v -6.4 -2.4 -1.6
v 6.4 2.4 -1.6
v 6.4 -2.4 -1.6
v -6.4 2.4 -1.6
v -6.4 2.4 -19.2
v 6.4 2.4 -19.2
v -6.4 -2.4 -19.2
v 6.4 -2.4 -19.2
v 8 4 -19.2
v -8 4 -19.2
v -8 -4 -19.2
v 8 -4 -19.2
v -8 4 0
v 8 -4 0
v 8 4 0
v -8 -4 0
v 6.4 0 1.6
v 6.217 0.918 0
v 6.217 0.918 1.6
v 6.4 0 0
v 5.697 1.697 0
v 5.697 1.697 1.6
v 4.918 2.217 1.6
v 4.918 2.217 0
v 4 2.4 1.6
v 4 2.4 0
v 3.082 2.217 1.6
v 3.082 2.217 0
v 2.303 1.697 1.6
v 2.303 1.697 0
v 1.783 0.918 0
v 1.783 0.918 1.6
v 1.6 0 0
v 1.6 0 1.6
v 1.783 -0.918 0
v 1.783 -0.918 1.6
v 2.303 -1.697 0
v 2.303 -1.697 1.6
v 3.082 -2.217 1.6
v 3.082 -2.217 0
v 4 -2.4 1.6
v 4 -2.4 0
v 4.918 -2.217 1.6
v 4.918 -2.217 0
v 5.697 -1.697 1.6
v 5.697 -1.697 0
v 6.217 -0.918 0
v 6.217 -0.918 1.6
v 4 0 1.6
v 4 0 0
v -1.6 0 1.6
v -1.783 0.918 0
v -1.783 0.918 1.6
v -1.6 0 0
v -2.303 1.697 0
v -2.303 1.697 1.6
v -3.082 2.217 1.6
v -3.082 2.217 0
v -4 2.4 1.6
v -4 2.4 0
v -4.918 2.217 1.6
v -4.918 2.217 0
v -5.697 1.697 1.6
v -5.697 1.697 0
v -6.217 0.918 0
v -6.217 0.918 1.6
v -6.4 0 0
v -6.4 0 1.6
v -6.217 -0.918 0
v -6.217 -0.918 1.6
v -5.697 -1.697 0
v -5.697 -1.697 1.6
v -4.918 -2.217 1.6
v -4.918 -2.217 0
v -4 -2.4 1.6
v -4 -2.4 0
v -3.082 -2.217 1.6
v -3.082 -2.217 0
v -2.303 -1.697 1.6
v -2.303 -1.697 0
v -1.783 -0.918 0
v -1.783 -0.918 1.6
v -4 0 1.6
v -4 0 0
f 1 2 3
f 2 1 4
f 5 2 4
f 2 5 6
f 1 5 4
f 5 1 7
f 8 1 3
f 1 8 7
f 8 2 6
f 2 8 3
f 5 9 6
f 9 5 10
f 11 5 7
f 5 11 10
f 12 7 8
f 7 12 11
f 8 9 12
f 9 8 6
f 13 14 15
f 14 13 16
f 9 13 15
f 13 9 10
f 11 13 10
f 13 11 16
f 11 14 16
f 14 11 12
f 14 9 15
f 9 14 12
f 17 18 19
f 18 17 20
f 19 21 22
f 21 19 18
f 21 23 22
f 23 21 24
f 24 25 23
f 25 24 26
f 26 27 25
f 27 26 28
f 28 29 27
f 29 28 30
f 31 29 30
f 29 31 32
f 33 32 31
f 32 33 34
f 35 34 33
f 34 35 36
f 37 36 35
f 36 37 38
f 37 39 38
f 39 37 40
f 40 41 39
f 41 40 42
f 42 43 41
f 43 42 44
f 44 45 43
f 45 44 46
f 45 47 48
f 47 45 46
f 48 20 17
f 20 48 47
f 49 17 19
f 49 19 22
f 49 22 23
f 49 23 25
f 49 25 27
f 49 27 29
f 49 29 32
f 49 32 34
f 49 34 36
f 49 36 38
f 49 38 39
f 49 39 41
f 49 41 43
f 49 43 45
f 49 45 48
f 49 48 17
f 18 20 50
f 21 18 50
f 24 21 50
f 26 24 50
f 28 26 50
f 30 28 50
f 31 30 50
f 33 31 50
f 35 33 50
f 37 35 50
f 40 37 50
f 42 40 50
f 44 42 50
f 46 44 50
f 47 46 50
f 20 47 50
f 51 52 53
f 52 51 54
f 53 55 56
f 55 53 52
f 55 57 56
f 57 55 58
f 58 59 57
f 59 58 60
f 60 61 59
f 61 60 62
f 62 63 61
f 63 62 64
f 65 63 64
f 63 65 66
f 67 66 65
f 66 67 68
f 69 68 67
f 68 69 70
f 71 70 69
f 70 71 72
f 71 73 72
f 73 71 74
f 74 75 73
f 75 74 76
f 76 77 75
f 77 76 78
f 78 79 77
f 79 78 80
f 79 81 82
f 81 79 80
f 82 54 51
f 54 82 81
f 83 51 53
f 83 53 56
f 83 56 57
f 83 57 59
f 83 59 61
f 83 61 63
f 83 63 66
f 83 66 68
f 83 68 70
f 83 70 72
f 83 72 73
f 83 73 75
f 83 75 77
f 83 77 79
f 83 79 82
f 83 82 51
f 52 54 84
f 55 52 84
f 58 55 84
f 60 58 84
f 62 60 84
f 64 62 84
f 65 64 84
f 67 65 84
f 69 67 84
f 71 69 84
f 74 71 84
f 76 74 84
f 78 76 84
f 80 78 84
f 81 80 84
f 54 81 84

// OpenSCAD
// file: ../p/4-4edge.scad
use <../lib.scad>
function ldraw_lib__4_4edge() = [
// 0 Circle 1.0
// 0 Name: 4-4edge.dat
// 0 Author: James Jessiman
// 0 !LDRAW_ORG Primitive UPDATE 2017-01
// 0 !LICENSE Licensed under CC BY 2.0 and CC BY 4.0 : see CAreadme.txt
// 
// 0 BFC CERTIFY CCW
  [0,"BFC","CERTIFY"],
  [0,"BFC","CCW"],
// 
// 0 !HISTORY 1998-12-15 [PTadmin] Official Update 1998-10
// 0 !HISTORY 2005-12-28 [PTadmin] Official Update 2005-01
// 0 !HISTORY 2007-06-24 [PTadmin] Header formatted for Contributor Agreement
// 0 !HISTORY 2008-07-01 [PTadmin] Official Update 2008-01
// 0 !HISTORY 2017-01-15 [Steffen] BFCed
// 0 !HISTORY 2017-12-30 [PTadmin] Official Update 2017-01
// 
// 
// 2 24 1 0 0 0.9239 0 0.3827
  [2,24,1,0,0,0.9239,0,0.3827],
// 2 24 0.9239 0 0.3827 0.7071 0 0.7071
  [2,24,0.9239,0,0.3827,0.7071,0,0.7071],
// 2 24 0.7071 0 0.7071 0.3827 0 0.9239
  [2,24,0.7071,0,0.7071,0.3827,0,0.9239],
// 2 24 0.3827 0 0.9239 0 0 1
  [2,24,0.3827,0,0.9239,0,0,1],
// 2 24 0 0 1 -0.3827 0 0.9239
  [2,24,0,0,1,-0.3827,0,0.9239],
// 2 24 -0.3827 0 0.9239 -0.7071 0 0.7071
  [2,24,-0.3827,0,0.9239,-0.7071,0,0.7071],
// 2 24 -0.7071 0 0.7071 -0.9239 0 0.3827
  [2,24,-0.7071,0,0.7071,-0.9239,0,0.3827],
// 2 24 -0.9239 0 0.3827 -1 0 -0
  [2,24,-0.9239,0,0.3827,-1,0,-0],
// 2 24 -1 0 -0 -0.9239 0 -0.3827
  [2,24,-1,0,-0,-0.9239,0,-0.3827],
// 2 24 -0.9239 0 -0.3827 -0.7071 0 -0.7071
  [2,24,-0.9239,0,-0.3827,-0.7071,0,-0.7071],
// 2 24 -0.7071 0 -0.7071 -0.3827 0 -0.9239
  [2,24,-0.7071,0,-0.7071,-0.3827,0,-0.9239],
// 2 24 -0.3827 0 -0.9239 0 0 -1
  [2,24,-0.3827,0,-0.9239,0,0,-1],
// 2 24 0 0 -1 0.3827 0 -0.9239
  [2,24,0,0,-1,0.3827,0,-0.9239],
// 2 24 0.3827 0 -0.9239 0.7071 0 -0.7071
  [2,24,0.3827,0,-0.9239,0.7071,0,-0.7071],
// 2 24 0.7071 0 -0.7071 0.9239 0 -0.3827
  [2,24,0.7071,0,-0.7071,0.9239,0,-0.3827],
// 2 24 0.9239 0 -0.3827 1 0 0
  [2,24,0.9239,0,-0.3827,1,0,0],
];
module ldraw_lib__4_4edge(step=0, col=false, unit=2/5, alt=false, line=0.2, solid=!$preview)
    makepoly(ldraw_lib__4_4edge(), step=step, col=col, unit=unit, alt=alt, line=line, solid=solid);
ldraw_lib__4_4edge(line=0.2);
// file: ../p/4-4disc.scad
use <../lib.scad>
function ldraw_lib__4_4disc() = [
// 0 Disc 1.0
// 0 Name: 4-4disc.dat
// 0 Author: James Jessiman
// 0 !LDRAW_ORG Primitive UPDATE 2002-02
// 0 !LICENSE Licensed under CC BY 2.0 and CC BY 4.0 : see CAreadme.txt
// 
// 0 BFC CERTIFY CCW
  [0,"BFC","CERTIFY"],
  [0,"BFC","CCW"],
// 
// 0 !HISTORY 1998-12-15 [PTadmin] Official Update 1998-10
// 0 !HISTORY 2002-03-23 [sbliss] Added BFC statement
// 0 !HISTORY 2002-04-25 [PTadmin] Official Update 2002-02
// 0 !HISTORY 2007-06-24 [PTadmin] Header formatted for Contributor Agreement
// 0 !HISTORY 2008-07-01 [PTadmin] Official Update 2008-01
// 
// 
// 3 16 0 0 0 1 0 0 0.9239 0 0.3827
  [3,16,0,0,0,1,0,0,0.9239,0,0.3827],
// 3 16 0 0 0 0.9239 0 0.3827 0.7071 0 0.7071
  [3,16,0,0,0,0.9239,0,0.3827,0.7071,0,0.7071],
// 3 16 0 0 0 0.7071 0 0.7071 0.3827 0 0.9239
  [3,16,0,0,0,0.7071,0,0.7071,0.3827,0,0.9239],
// 3 16 0 0 0 0.3827 0 0.9239 0 0 1
  [3,16,0,0,0,0.3827,0,0.9239,0,0,1],
// 3 16 0 0 0 0 0 1 -0.3827 0 0.9239
  [3,16,0,0,0,0,0,1,-0.3827,0,0.9239],
// 3 16 0 0 0 -0.3827 0 0.9239 -0.7071 0 0.7071
  [3,16,0,0,0,-0.3827,0,0.9239,-0.7071,0,0.7071],
// 3 16 0 0 0 -0.7071 0 0.7071 -0.9239 0 0.3827
  [3,16,0,0,0,-0.7071,0,0.7071,-0.9239,0,0.3827],
// 3 16 0 0 0 -0.9239 0 0.3827 -1 0 -0
  [3,16,0,0,0,-0.9239,0,0.3827,-1,0,-0],
// 3 16 0 0 0 -1 0 -0 -0.9239 0 -0.3827
  [3,16,0,0,0,-1,0,-0,-0.9239,0,-0.3827],
// 3 16 0 0 0 -0.9239 0 -0.3827 -0.7071 0 -0.7071
  [3,16,0,0,0,-0.9239,0,-0.3827,-0.7071,0,-0.7071],
// 3 16 0 0 0 -0.7071 0 -0.7071 -0.3827 0 -0.9239
  [3,16,0,0,0,-0.7071,0,-0.7071,-0.3827,0,-0.9239],
// 3 16 0 0 0 -0.3827 0 -0.9239 0 0 -1
  [3,16,0,0,0,-0.3827,0,-0.9239,0,0,-1],
// 3 16 0 0 0 0 0 -1 0.3827 0 -0.9239
  [3,16,0,0,0,0,0,-1,0.3827,0,-0.9239],
// 3 16 0 0 0 0.3827 0 -0.9239 0.7071 0 -0.7071
  [3,16,0,0,0,0.3827,0,-0.9239,0.7071,0,-0.7071],
// 3 16 0 0 0 0.7071 0 -0.7071 0.9239 0 -0.3827
  [3,16,0,0,0,0.7071,0,-0.7071,0.9239,0,-0.3827],
// 3 16 0 0 0 0.9239 0 -0.3827 1 0 0
  [3,16,0,0,0,0.9239,0,-0.3827,1,0,0],
// 0
];
module ldraw_lib__4_4disc(step=0, col=false, unit=2/5, alt=false, line=0.2, solid=!$preview)
    makepoly(ldraw_lib__4_4disc(), step=step, col=col, unit=unit, alt=alt, line=line, solid=solid);
ldraw_lib__4_4disc(line=0.2);
// file: ../p/4-4cyli.scad
use <../lib.scad>
function ldraw_lib__4_4cyli() = [
// 0 Cylinder 1.0
// 0 Name: 4-4cyli.dat
// 0 Author: James Jessiman
// 0 !LDRAW_ORG Primitive UPDATE 2005-01
// 0 !LICENSE Licensed under CC BY 4.0 : see CAreadme.txt
// 
// 0 BFC CERTIFY CCW
  [0,"BFC","CERTIFY"],
  [0,"BFC","CCW"],
// 
// 0 !HISTORY 1998-12-15 [PTadmin] Official Update 1998-10
// 0 !HISTORY 2002-03-23 [sbliss] Added BFC statement; merged headers from files in distributions LDraw 0.27 and Complete.
// 0 !HISTORY 2002-04-25 [PTadmin] Official Update 2002-02
// 0 !HISTORY 2004-12-14 [guyvivan] BFC CCW
// 0 !HISTORY 2005-12-28 [PTadmin] Official Update 2005-01
// 0 !HISTORY 2007-06-24 [PTadmin] Header formatted for Contributor Agreement
// 0 !HISTORY 2008-07-01 [PTadmin] Official Update 2008-01
// 
// 
// 4 16 1 1 0 0.9239 1 0.3827 0.9239 0 0.3827 1 0 0
  [4,16,1,1,0,0.9239,1,0.3827,0.9239,0,0.3827,1,0,0],
// 5 24 1 0 0 1 1 0 0.9239 0 0.3827 0.9239 0 -0.3827
  [5,24,1,0,0,1,1,0,0.9239,0,0.3827,0.9239,0,-0.3827],
// 4 16 0.9239 1 0.3827 0.7071 1 0.7071 0.7071 0 0.7071 0.9239 0 0.3827
  [4,16,0.9239,1,0.3827,0.7071,1,0.7071,0.7071,0,0.7071,0.9239,0,0.3827],
// 5 24 0.9239 0 0.3827 0.9239 1 0.3827 0.7071 0 0.7071 1 0 0
  [5,24,0.9239,0,0.3827,0.9239,1,0.3827,0.7071,0,0.7071,1,0,0],
// 4 16 0.7071 1 0.7071 0.3827 1 0.9239 0.3827 0 0.9239 0.7071 0 0.7071
  [4,16,0.7071,1,0.7071,0.3827,1,0.9239,0.3827,0,0.9239,0.7071,0,0.7071],
// 5 24 0.7071 0 0.7071 0.7071 1 0.7071 0.3827 0 0.9239 0.9239 0 0.3827
  [5,24,0.7071,0,0.7071,0.7071,1,0.7071,0.3827,0,0.9239,0.9239,0,0.3827],
// 4 16 0.3827 1 0.9239 0 1 1 0 0 1 0.3827 0 0.9239
  [4,16,0.3827,1,0.9239,0,1,1,0,0,1,0.3827,0,0.9239],
// 5 24 0.3827 0 0.9239 0.3827 1 0.9239 0 0 1 0.7071 0 0.7071
  [5,24,0.3827,0,0.9239,0.3827,1,0.9239,0,0,1,0.7071,0,0.7071],
// 4 16 0 1 1 -0.3827 1 0.9239 -0.3827 0 0.9239 0 0 1
  [4,16,0,1,1,-0.3827,1,0.9239,-0.3827,0,0.9239,0,0,1],
// 5 24 0 0 1 0 1 1 -0.3827 0 0.9239 0.3827 0 0.9239
  [5,24,0,0,1,0,1,1,-0.3827,0,0.9239,0.3827,0,0.9239],
// 4 16 -0.3827 1 0.9239 -0.7071 1 0.7071 -0.7071 0 0.7071 -0.3827 0 0.9239
  [4,16,-0.3827,1,0.9239,-0.7071,1,0.7071,-0.7071,0,0.7071,-0.3827,0,0.9239],
// 5 24 -0.3827 0 0.9239 -0.3827 1 0.9239 -0.7071 0 0.7071 0 0 1
  [5,24,-0.3827,0,0.9239,-0.3827,1,0.9239,-0.7071,0,0.7071,0,0,1],
// 4 16 -0.7071 1 0.7071 -0.9239 1 0.3827 -0.9239 0 0.3827 -0.7071 0 0.7071
  [4,16,-0.7071,1,0.7071,-0.9239,1,0.3827,-0.9239,0,0.3827,-0.7071,0,0.7071],
// 5 24 -0.7071 0 0.7071 -0.7071 1 0.7071 -0.9239 0 0.3827 -0.3827 0 0.9239
  [5,24,-0.7071,0,0.7071,-0.7071,1,0.7071,-0.9239,0,0.3827,-0.3827,0,0.9239],
// 4 16 -0.9239 1 0.3827 -1 1 0 -1 0 0 -0.9239 0 0.3827
  [4,16,-0.9239,1,0.3827,-1,1,0,-1,0,0,-0.9239,0,0.3827],
// 5 24 -0.9239 0 0.3827 -0.9239 1 0.3827 -1 0 0 -0.7071 0 0.7071
  [5,24,-0.9239,0,0.3827,-0.9239,1,0.3827,-1,0,0,-0.7071,0,0.7071],
// 4 16 -1 1 0 -0.9239 1 -0.3827 -0.9239 0 -0.3827 -1 0 0
  [4,16,-1,1,0,-0.9239,1,-0.3827,-0.9239,0,-0.3827,-1,0,0],
// 5 24 -1 0 0 -1 1 0 -0.9239 0 -0.3827 -0.9239 0 0.3827
  [5,24,-1,0,0,-1,1,0,-0.9239,0,-0.3827,-0.9239,0,0.3827],
// 4 16 -0.9239 1 -0.3827 -0.7071 1 -0.7071 -0.7071 0 -0.7071 -0.9239 0 -0.3827
  [4,16,-0.9239,1,-0.3827,-0.7071,1,-0.7071,-0.7071,0,-0.7071,-0.9239,0,-0.3827],
// 5 24 -0.9239 0 -0.3827 -0.9239 1 -0.3827 -0.7071 0 -0.7071 -1 0 0
  [5,24,-0.9239,0,-0.3827,-0.9239,1,-0.3827,-0.7071,0,-0.7071,-1,0,0],
// 4 16 -0.7071 1 -0.7071 -0.3827 1 -0.9239 -0.3827 0 -0.9239 -0.7071 0 -0.7071
  [4,16,-0.7071,1,-0.7071,-0.3827,1,-0.9239,-0.3827,0,-0.9239,-0.7071,0,-0.7071],
// 5 24 -0.7071 0 -0.7071 -0.7071 1 -0.7071 -0.3827 0 -0.9239 -0.9239 0 -0.3827
  [5,24,-0.7071,0,-0.7071,-0.7071,1,-0.7071,-0.3827,0,-0.9239,-0.9239,0,-0.3827],
// 4 16 -0.3827 1 -0.9239 0 1 -1 0 0 -1 -0.3827 0 -0.9239
  [4,16,-0.3827,1,-0.9239,0,1,-1,0,0,-1,-0.3827,0,-0.9239],
// 5 24 -0.3827 0 -0.9239 -0.3827 1 -0.9239 0 0 -1 -0.7071 0 -0.7071
  [5,24,-0.3827,0,-0.9239,-0.3827,1,-0.9239,0,0,-1,-0.7071,0,-0.7071],
// 4 16 0 1 -1 0.3827 1 -0.9239 0.3827 0 -0.9239 0 0 -1
  [4,16,0,1,-1,0.3827,1,-0.9239,0.3827,0,-0.9239,0,0,-1],
// 5 24 0 0 -1 0 1 -1 0.3827 0 -0.9239 -0.3827 0 -0.9239
  [5,24,0,0,-1,0,1,-1,0.3827,0,-0.9239,-0.3827,0,-0.9239],
// 4 16 0.3827 1 -0.9239 0.7071 1 -0.7071 0.7071 0 -0.7071 0.3827 0 -0.9239
  [4,16,0.3827,1,-0.9239,0.7071,1,-0.7071,0.7071,0,-0.7071,0.3827,0,-0.9239],
// 5 24 0.3827 0 -0.9239 0.3827 1 -0.9239 0.7071 0 -0.7071 0 0 -1
  [5,24,0.3827,0,-0.9239,0.3827,1,-0.9239,0.7071,0,-0.7071,0,0,-1],
// 4 16 0.7071 1 -0.7071 0.9239 1 -0.3827 0.9239 0 -0.3827 0.7071 0 -0.7071
  [4,16,0.7071,1,-0.7071,0.9239,1,-0.3827,0.9239,0,-0.3827,0.7071,0,-0.7071],
// 5 24 0.7071 0 -0.7071 0.7071 1 -0.7071 0.9239 0 -0.3827 0.3827 0 -0.9239
  [5,24,0.7071,0,-0.7071,0.7071,1,-0.7071,0.9239,0,-0.3827,0.3827,0,-0.9239],
// 4 16 0.9239 1 -0.3827 1 1 0 1 0 0 0.9239 0 -0.3827
  [4,16,0.9239,1,-0.3827,1,1,0,1,0,0,0.9239,0,-0.3827],
// 5 24 0.9239 0 -0.3827 0.9239 1 -0.3827 1 0 0 0.7071 0 -0.7071
  [5,24,0.9239,0,-0.3827,0.9239,1,-0.3827,1,0,0,0.7071,0,-0.7071],
// 0
];
module ldraw_lib__4_4cyli(step=0, col=false, unit=2/5, alt=false, line=0.2, solid=!$preview)
    makepoly(ldraw_lib__4_4cyli(), step=step, col=col, unit=unit, alt=alt, line=line, solid=solid);
ldraw_lib__4_4cyli(line=0.2);
// file: ../p/stud.scad
use <../lib.scad>
use <4-4cyli.scad>
use <4-4disc.scad>
use <4-4edge.scad>
function ldraw_lib__stud() = [
// 0 Stud
// 0 Name: stud.dat
// 0 Author: James Jessiman
// 0 !LDRAW_ORG Primitive UPDATE 2012-01
// 0 !LICENSE Licensed under CC BY 4.0 : see CAreadme.txt
// 
// 0 BFC CERTIFY CCW
  [0,"BFC","CERTIFY"],
  [0,"BFC","CCW"],
// 
// 0 !HISTORY 2002-04-04 [sbliss] Modified for BFC compliance
// 0 !HISTORY 2002-04-25 [PTadmin] Official Update 2002-02
// 0 !HISTORY 2007-06-24 [PTadmin] Header formatted for Contributor Agreement
// 0 !HISTORY 2008-07-01 [PTadmin] Official Update 2008-01
// 0 !HISTORY 2012-02-16 [Philo] Changed to CCW
// 0 !HISTORY 2012-03-30 [PTadmin] Official Update 2012-01
// 
// 
// 1 16 0 0 0 6 0 0 0 1 0 0 0 6 4-4edge.dat
  [1,16,0,0,0,6,0,0,0,1,0,0,0,6, ldraw_lib__4_4edge()],
// 1 16 0 -4 0 6 0 0 0 1 0 0 0 6 4-4edge.dat
  [1,16,0,-4,0,6,0,0,0,1,0,0,0,6, ldraw_lib__4_4edge()],
// 1 16 0 0 0 6 0 0 0 -4 0 0 0 6 4-4cyli.dat
  [1,16,0,0,0,6,0,0,0,-4,0,0,0,6, ldraw_lib__4_4cyli()],
// 1 16 0 -4 0 6 0 0 0 1 0 0 0 6 4-4disc.dat
  [1,16,0,-4,0,6,0,0,0,1,0,0,0,6, ldraw_lib__4_4disc()],
  [-1,16,0,0,0,6,0,0,0,-1,0,0,0,6, ldraw_lib__4_4disc()],
];
module ldraw_lib__stud(step=0, col=false, unit=2/5, alt=false, line=0.2, solid=!$preview)
    makepoly(ldraw_lib__stud(), step=step, col=col, unit=unit, alt=alt, line=line, solid=solid);
ldraw_lib__stud(line=0.2);
// file: ../p/box5.scad
use <../lib.scad>
function ldraw_lib__box5() = [
// 0 Box with 5 Faces and All Edges
// 0 Name: box5.dat
// 0 Author: James Jessiman
// 0 !LDRAW_ORG Primitive UPDATE 2012-01
// 0 !LICENSE Licensed under CC BY 2.0 and CC BY 4.0 : see CAreadme.txt
// 
// 0 BFC CERTIFY CCW
  [0,"BFC","CERTIFY"],
  [0,"BFC","CCW"],
// 
// 0 !HISTORY 2002-04-03 [sbliss] Modified for BFC compliance
// 0 !HISTORY 2002-04-25 [PTadmin] Official Update 2002-02
// 0 !HISTORY 2007-06-24 [PTadmin] Header formatted for Contributor Agreement
// 0 !HISTORY 2008-07-01 [PTadmin] Official Update 2008-01
// 0 !HISTORY 2012-02-16 [Philo] Changed to CCW
// 0 !HISTORY 2012-03-30 [PTadmin] Official Update 2012-01
// 
// 
// 2 24 1 1 1 -1 1 1
  [2,24,1,1,1,-1,1,1],
// 2 24 -1 1 1 -1 1 -1
  [2,24,-1,1,1,-1,1,-1],
// 2 24 -1 1 -1 1 1 -1
  [2,24,-1,1,-1,1,1,-1],
// 2 24 1 1 -1 1 1 1
  [2,24,1,1,-1,1,1,1],
// 2 24 1 0 1 -1 0 1
  [2,24,1,0,1,-1,0,1],
// 2 24 -1 0 1 -1 0 -1
  [2,24,-1,0,1,-1,0,-1],
// 2 24 -1 0 -1 1 0 -1
  [2,24,-1,0,-1,1,0,-1],
// 2 24 1 0 -1 1 0 1
  [2,24,1,0,-1,1,0,1],
// 2 24 1 0 1 1 1 1
  [2,24,1,0,1,1,1,1],
// 2 24 -1 0 1 -1 1 1
  [2,24,-1,0,1,-1,1,1],
// 2 24 1 0 -1 1 1 -1
  [2,24,1,0,-1,1,1,-1],
// 2 24 -1 0 -1 -1 1 -1
  [2,24,-1,0,-1,-1,1,-1],
// 4 16 -1 1 1 1 1 1 1 1 -1 -1 1 -1
  [4,16,-1,1,1,1,1,1,1,1,-1,-1,1,-1],
// 4 16 -1 1 1 -1 0 1 1 0 1 1 1 1
  [4,16,-1,1,1,-1,0,1,1,0,1,1,1,1],
// 4 16 -1 1 -1 -1 0 -1 -1 0 1 -1 1 1
  [4,16,-1,1,-1,-1,0,-1,-1,0,1,-1,1,1],
// 4 16 1 1 -1 1 0 -1 -1 0 -1 -1 1 -1
  [4,16,1,1,-1,1,0,-1,-1,0,-1,-1,1,-1],
// 4 16 1 1 1 1 0 1 1 0 -1 1 1 -1
  [4,16,1,1,1,1,0,1,1,0,-1,1,1,-1],
];
makepoly(ldraw_lib__box5(), line=0.2);
// main file
use <../lib.scad>
use <../p/box5.scad>
use <../p/stud.scad>
function ldraw_lib__772() = [
// 0 Brick  1 x  2 x  2 without Centre Studs
// 0 Name: 772.dat
// 0 Author: Chris Dee [cwdee]
// 0 !LDRAW_ORG Part UPDATE 2010-01
// 0 !LICENSE Licensed under CC BY 4.0 : see CAreadme.txt
// 
// 0 BFC CERTIFY CCW
  [0,"BFC","CERTIFY"],
  [0,"BFC","CCW"],
// 
// 0 !HISTORY 2000-05-07 [PTadmin] Official Update 2000-01
// 0 !HISTORY 2007-07-22 [PTadmin] Header formatted for Contributor Agreement
// 0 !HISTORY 2008-07-01 [PTadmin] Official Update 2008-01
// 0 !HISTORY 2010-01-15 [Eldar] Add BFC
// 0 !HISTORY 2010-04-05 [PTadmin] Official Update 2010-01
// 
// 
// 0 BFC INVERTNEXT
  [0,"BFC","INVERTNEXT"],
// 1 16 0 48 0 16 0 0 0 -44 0 0 0 6 box5.dat
  [1,16,0,48,0,16,0,0,0,-44,0,0,0,6, ldraw_lib__box5()],
// 4 16 20 48 10 16 48 6 -16 48 6 -20 48 10
  [4,16,20,48,10,16,48,6,-16,48,6,-20,48,10],
// 4 16 -20 48 10 -16 48 6 -16 48 -6 -20 48 -10
  [4,16,-20,48,10,-16,48,6,-16,48,-6,-20,48,-10],
// 4 16 -20 48 -10 -16 48 -6 16 48 -6 20 48 -10
  [4,16,-20,48,-10,-16,48,-6,16,48,-6,20,48,-10],
// 4 16 20 48 -10 16 48 -6 16 48 6 20 48 10
  [4,16,20,48,-10,16,48,-6,16,48,6,20,48,10],
// 1 16 0 48 0 20 0 0 0 -48 0 0 0 10 box5.dat
  [1,16,0,48,0,20,0,0,0,-48,0,0,0,10, ldraw_lib__box5()],
// 1 16 10 0 0 1 0 0 0 1 0 0 0 1 stud.dat
  [1,16,10,0,0,1,0,0,0,1,0,0,0,1, ldraw_lib__stud()],
// 1 16 -10 0 0 1 0 0 0 1 0 0 0 1 stud.dat
  [1,16,-10,0,0,1,0,0,0,1,0,0,0,1, ldraw_lib__stud()],
];
module ldraw_lib__772(step=0, col=false, unit=2/5, alt=false, line=0.2, solid=!$preview)
    makepoly(ldraw_lib__772(), step=step, col=col, unit=unit, alt=alt, line=line, solid=solid);
ldraw_lib__772(line=0.2);
